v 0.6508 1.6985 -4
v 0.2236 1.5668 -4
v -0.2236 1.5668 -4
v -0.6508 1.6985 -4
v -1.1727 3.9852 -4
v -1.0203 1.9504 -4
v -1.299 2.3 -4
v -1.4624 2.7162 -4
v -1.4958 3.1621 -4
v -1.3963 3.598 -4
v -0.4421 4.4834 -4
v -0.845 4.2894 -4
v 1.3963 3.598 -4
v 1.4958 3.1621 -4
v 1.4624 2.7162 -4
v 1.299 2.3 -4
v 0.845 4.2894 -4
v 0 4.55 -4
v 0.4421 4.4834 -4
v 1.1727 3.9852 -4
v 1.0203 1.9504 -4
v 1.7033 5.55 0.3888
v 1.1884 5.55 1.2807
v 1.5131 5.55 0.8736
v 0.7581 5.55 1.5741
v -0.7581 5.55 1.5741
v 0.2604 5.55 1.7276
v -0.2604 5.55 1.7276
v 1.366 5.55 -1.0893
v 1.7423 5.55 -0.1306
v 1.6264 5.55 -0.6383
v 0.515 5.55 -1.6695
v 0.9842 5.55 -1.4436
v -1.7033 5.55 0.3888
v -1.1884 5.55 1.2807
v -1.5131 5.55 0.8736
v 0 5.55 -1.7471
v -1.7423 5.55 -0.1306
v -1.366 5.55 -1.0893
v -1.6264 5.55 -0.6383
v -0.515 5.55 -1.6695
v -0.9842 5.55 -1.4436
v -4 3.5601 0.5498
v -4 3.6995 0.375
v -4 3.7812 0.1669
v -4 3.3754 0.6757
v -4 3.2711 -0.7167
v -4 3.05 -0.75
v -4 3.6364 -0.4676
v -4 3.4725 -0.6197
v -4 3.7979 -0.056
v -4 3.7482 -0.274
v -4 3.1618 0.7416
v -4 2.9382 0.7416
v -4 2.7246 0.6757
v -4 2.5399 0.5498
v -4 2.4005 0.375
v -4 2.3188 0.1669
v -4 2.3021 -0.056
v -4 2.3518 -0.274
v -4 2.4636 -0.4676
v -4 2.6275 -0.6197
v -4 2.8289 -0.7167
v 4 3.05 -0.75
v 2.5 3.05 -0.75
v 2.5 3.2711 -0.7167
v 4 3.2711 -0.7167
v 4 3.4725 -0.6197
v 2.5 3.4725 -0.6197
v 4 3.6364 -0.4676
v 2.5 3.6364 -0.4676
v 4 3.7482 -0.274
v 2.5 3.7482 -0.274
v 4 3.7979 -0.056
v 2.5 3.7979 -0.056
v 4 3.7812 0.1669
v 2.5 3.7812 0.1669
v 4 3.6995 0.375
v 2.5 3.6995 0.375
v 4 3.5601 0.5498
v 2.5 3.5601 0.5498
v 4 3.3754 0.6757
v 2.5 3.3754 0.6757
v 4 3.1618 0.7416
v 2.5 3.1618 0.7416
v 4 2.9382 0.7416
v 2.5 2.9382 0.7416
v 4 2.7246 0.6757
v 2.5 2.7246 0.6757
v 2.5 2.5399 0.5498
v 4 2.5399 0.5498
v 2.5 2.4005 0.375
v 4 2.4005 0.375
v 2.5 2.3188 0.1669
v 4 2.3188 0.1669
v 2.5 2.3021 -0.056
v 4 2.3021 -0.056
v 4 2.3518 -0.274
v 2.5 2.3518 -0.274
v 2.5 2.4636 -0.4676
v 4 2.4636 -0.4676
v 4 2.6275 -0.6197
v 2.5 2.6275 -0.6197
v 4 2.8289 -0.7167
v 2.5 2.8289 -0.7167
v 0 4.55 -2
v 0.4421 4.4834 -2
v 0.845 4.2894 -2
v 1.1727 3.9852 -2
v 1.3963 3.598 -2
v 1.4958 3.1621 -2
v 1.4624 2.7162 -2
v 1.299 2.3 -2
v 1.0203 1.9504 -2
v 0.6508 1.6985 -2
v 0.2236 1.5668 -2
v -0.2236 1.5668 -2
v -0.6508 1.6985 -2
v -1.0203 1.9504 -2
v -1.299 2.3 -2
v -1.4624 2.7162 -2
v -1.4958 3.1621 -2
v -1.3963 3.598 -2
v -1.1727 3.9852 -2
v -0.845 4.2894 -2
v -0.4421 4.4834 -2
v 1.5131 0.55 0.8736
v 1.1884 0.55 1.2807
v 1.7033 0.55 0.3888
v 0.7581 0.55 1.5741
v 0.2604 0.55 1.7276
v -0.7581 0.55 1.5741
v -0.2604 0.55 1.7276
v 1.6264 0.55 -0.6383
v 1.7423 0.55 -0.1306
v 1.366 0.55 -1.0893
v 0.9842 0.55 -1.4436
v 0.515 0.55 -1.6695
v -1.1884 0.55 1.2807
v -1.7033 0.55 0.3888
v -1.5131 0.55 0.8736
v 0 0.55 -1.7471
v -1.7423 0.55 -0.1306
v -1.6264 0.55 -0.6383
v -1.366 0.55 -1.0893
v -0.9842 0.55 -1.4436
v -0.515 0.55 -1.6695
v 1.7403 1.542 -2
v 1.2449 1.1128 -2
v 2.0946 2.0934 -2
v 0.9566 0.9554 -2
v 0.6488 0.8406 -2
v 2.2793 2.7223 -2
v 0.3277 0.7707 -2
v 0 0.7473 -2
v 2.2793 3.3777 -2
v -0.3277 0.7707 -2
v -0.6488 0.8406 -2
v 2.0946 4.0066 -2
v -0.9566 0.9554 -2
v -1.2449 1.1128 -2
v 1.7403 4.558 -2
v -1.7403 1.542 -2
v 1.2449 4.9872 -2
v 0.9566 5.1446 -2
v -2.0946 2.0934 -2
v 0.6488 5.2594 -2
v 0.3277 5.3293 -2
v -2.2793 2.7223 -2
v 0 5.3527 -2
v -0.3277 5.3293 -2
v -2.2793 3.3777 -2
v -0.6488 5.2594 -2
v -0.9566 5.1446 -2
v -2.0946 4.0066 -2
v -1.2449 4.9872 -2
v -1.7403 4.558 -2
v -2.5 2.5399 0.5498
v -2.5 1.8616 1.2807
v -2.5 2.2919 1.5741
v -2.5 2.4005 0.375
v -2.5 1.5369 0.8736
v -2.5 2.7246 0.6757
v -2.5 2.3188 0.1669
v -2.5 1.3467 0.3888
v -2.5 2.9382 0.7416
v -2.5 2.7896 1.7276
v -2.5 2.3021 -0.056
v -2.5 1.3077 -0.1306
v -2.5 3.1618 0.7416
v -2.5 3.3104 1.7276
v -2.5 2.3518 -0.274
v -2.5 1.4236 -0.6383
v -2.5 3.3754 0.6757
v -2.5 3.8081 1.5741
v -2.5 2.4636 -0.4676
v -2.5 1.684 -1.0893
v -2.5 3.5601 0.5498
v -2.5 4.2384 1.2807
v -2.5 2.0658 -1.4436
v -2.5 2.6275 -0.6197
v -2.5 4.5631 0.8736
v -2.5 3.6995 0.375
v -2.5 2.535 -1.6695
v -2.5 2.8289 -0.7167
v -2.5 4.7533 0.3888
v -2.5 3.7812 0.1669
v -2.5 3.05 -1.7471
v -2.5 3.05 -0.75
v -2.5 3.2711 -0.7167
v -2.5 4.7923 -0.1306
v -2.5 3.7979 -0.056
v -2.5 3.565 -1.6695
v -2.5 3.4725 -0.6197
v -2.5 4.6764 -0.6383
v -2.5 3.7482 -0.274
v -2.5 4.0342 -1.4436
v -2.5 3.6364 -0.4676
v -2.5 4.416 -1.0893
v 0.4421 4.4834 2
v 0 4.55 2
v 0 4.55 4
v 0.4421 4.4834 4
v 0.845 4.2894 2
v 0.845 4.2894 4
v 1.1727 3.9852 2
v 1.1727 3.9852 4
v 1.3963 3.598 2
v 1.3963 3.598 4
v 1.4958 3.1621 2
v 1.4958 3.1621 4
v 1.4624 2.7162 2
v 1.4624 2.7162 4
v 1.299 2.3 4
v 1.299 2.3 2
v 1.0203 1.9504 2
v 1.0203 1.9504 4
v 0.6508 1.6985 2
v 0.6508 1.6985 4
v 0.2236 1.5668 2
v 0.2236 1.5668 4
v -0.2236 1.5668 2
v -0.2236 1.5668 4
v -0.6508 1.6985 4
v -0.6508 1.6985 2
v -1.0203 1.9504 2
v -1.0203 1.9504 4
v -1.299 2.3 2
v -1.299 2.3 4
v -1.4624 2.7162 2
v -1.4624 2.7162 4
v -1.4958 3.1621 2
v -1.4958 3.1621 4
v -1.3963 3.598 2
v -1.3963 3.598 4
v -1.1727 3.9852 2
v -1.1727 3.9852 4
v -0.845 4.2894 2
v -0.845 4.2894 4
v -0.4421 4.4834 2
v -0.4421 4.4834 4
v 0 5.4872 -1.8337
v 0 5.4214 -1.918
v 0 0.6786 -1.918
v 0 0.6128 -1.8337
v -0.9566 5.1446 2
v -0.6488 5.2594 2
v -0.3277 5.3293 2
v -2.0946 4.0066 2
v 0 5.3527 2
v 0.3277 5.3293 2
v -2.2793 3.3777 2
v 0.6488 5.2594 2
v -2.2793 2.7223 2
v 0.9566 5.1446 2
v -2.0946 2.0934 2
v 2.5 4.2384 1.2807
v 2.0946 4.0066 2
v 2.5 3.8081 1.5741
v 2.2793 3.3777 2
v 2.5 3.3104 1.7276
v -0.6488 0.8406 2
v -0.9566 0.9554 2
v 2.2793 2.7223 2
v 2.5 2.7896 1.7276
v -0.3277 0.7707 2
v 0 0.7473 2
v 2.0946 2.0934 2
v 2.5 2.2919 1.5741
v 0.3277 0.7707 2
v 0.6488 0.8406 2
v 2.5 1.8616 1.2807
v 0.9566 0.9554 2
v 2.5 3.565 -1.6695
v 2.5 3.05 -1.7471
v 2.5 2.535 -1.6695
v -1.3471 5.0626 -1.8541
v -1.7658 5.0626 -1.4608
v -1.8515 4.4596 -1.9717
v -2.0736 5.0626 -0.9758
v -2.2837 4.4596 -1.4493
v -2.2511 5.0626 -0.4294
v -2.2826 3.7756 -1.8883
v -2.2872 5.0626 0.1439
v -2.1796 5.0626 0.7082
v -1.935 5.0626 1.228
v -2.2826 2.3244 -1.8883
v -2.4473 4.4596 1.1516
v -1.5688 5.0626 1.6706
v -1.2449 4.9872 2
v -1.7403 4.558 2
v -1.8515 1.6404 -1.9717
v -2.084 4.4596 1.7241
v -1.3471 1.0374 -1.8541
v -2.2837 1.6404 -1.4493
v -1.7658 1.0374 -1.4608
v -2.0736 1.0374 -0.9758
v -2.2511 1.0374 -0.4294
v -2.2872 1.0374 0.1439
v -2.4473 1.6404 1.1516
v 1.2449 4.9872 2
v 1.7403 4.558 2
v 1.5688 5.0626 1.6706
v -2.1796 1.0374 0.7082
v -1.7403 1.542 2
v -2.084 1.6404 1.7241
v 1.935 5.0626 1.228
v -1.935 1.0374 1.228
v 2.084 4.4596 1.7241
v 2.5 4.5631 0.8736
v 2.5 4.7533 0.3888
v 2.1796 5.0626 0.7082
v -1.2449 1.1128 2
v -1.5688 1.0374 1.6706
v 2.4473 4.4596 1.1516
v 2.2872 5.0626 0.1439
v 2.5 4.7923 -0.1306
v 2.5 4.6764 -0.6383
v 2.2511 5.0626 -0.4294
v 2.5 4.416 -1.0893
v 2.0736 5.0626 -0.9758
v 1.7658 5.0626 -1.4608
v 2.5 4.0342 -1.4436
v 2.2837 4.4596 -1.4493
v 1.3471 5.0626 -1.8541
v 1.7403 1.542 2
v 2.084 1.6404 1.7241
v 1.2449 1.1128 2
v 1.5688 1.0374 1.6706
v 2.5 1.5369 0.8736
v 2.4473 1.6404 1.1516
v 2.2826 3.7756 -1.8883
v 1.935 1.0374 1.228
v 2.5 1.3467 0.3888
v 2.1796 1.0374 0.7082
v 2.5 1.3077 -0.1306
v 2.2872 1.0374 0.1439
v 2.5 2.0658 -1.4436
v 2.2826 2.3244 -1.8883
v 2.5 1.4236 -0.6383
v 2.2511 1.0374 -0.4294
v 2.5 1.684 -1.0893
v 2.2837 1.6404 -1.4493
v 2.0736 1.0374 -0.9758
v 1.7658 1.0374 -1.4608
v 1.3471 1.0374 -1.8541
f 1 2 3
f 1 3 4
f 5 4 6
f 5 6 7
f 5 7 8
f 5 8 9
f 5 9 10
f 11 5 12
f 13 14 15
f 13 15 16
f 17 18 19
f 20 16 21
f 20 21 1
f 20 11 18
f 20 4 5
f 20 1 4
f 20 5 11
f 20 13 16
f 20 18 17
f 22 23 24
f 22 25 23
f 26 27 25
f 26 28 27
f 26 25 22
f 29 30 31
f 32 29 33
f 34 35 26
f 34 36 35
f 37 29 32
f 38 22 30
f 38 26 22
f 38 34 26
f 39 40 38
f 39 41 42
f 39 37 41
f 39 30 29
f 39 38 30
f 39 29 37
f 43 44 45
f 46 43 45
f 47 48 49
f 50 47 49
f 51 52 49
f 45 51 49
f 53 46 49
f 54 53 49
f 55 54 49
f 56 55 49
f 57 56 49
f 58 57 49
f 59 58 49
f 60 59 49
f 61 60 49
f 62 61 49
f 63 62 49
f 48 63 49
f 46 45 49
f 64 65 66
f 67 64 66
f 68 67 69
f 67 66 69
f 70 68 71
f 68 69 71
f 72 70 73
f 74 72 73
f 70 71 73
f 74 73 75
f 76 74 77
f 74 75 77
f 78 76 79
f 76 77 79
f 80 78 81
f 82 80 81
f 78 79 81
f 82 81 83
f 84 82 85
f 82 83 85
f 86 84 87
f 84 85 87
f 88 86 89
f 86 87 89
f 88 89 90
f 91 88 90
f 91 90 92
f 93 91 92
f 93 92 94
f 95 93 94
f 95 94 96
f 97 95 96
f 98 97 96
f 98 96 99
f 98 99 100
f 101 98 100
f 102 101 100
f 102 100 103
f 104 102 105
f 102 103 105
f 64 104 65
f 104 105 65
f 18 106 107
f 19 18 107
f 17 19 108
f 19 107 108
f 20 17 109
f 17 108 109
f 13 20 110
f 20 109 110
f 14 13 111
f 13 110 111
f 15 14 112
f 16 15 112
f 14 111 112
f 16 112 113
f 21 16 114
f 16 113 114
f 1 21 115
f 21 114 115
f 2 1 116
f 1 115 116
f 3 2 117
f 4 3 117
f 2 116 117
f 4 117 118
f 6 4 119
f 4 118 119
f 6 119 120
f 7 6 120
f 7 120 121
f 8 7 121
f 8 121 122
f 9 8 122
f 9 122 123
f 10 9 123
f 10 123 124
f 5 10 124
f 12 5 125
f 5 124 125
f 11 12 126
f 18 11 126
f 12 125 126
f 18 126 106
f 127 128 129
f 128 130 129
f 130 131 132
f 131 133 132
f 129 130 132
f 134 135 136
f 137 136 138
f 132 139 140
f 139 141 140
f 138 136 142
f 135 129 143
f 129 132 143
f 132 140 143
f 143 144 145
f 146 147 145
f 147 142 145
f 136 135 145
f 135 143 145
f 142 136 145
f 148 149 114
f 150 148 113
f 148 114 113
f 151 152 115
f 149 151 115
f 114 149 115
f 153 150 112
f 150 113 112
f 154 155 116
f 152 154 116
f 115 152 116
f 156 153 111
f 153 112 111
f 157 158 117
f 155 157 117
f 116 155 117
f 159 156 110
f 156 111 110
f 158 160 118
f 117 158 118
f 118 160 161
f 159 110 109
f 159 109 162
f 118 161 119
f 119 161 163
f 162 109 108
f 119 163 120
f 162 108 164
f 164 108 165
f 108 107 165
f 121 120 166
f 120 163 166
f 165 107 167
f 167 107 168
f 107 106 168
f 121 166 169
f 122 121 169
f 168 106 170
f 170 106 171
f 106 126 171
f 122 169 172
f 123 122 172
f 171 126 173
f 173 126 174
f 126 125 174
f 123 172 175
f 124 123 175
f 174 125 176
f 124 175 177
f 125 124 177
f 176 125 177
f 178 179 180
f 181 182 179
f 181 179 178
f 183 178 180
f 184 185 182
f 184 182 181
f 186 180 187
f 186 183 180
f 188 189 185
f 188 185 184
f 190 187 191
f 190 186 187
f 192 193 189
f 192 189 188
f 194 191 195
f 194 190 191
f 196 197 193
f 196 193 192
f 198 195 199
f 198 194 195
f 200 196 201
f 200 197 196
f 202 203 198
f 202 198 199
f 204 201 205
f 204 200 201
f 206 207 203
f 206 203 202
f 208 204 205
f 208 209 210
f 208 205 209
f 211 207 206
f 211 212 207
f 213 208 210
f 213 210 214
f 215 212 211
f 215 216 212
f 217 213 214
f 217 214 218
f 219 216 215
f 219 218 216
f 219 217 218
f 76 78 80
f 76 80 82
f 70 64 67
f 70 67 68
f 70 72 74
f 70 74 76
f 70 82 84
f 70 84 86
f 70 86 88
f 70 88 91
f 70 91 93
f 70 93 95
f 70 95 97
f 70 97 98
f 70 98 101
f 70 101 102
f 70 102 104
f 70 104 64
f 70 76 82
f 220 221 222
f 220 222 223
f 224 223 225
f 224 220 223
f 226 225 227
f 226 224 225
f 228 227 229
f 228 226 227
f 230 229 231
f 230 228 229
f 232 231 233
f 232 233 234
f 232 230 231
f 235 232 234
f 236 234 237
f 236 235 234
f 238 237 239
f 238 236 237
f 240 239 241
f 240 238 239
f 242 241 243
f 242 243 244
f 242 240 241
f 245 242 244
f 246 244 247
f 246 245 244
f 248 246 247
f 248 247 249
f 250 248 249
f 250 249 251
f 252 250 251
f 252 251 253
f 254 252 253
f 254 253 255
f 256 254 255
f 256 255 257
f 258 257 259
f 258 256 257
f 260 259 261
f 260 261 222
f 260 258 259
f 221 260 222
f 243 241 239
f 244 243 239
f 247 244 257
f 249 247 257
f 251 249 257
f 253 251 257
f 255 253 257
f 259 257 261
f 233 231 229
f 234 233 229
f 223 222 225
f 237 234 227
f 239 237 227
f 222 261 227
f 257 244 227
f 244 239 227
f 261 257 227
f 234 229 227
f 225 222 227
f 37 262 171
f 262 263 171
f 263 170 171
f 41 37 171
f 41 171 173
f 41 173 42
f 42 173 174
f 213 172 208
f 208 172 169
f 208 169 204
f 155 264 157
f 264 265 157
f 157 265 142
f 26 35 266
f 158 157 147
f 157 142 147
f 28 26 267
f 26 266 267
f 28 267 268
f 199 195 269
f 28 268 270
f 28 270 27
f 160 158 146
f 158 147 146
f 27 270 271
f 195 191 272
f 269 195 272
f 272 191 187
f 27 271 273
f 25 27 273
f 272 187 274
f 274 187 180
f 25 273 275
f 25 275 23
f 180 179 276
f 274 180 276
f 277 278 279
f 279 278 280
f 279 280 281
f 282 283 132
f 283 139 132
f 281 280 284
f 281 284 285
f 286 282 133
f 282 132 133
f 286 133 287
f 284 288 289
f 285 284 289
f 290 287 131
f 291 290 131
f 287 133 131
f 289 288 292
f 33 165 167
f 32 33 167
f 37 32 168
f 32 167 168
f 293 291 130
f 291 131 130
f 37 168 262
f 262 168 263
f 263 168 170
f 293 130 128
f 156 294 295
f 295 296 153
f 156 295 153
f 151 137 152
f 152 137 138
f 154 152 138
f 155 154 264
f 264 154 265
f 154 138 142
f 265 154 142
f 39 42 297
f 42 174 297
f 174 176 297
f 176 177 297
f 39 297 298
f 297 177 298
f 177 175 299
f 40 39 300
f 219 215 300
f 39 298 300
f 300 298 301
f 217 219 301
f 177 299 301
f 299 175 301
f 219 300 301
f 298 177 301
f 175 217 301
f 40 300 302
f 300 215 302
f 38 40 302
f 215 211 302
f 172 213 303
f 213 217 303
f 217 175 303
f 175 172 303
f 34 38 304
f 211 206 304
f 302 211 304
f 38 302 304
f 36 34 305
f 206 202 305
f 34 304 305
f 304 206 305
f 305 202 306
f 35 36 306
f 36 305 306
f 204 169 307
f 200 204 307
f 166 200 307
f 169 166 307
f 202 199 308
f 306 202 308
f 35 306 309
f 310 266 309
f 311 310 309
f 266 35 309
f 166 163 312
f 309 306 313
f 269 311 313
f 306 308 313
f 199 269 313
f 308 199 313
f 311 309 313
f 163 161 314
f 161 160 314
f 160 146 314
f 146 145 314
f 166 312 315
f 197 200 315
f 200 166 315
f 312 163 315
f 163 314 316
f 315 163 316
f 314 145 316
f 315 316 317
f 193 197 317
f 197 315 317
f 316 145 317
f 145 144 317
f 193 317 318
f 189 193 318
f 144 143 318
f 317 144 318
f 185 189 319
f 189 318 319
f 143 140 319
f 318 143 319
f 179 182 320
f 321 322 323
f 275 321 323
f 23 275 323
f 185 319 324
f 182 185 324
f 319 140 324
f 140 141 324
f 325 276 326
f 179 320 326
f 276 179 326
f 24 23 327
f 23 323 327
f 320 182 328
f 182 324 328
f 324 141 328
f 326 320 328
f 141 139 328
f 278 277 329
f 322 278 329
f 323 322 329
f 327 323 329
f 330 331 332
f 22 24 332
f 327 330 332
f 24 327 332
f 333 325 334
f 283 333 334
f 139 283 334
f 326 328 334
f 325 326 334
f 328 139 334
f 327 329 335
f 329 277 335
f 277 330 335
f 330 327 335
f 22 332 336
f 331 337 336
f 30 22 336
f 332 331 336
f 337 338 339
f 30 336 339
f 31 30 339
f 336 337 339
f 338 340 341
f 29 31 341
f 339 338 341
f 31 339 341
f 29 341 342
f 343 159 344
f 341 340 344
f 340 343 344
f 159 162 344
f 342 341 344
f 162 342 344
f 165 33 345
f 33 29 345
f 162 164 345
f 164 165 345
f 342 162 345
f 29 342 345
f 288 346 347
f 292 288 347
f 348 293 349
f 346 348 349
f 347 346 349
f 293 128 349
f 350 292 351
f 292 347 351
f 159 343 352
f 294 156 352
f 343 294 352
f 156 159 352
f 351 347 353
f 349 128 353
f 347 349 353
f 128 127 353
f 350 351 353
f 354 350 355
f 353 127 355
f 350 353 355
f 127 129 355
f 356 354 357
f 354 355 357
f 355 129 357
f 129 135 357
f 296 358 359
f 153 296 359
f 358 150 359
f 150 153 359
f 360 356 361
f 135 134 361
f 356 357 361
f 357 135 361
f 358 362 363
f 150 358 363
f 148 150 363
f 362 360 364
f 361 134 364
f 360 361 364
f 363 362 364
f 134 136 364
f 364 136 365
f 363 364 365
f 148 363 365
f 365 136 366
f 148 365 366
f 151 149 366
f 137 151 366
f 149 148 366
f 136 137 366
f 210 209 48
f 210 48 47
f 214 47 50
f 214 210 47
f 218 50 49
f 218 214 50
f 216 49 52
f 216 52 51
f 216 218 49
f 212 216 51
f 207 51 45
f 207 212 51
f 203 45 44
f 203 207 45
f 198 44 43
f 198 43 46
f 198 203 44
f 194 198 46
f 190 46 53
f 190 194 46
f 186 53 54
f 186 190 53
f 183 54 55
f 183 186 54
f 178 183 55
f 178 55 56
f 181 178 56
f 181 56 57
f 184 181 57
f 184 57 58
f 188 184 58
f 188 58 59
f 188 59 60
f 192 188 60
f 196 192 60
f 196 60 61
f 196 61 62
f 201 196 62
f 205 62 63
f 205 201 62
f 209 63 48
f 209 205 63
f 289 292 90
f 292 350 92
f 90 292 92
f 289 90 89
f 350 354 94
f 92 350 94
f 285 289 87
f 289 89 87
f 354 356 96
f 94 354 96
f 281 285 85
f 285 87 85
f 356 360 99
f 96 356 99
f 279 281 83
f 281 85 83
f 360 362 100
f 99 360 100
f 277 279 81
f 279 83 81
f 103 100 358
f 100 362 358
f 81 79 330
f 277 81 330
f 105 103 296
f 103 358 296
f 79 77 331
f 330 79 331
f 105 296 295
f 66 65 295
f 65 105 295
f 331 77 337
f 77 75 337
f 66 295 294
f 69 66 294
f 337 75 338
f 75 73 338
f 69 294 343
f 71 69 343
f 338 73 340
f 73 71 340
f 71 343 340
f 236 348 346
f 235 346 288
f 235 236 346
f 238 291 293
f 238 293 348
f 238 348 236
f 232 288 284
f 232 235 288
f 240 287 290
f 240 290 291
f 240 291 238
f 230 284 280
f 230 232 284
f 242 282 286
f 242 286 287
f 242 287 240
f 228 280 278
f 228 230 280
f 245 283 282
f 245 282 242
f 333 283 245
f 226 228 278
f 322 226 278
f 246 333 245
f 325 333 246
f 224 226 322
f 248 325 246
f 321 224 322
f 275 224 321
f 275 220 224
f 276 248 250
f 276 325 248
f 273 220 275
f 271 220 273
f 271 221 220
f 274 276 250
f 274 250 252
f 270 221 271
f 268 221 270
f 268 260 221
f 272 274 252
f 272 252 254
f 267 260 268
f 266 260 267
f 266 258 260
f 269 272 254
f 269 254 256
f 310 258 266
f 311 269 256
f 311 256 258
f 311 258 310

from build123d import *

# Parameters (mm, degrees)
CUT_EXTRUDE1_DEPTH      = 8.470943715
CUT_EXTRUDE1_DEPTH_BACK = 8.470943715
SKETCH3_OUTSIDE_W       = 10.214
SKETCH3_OUTSIDE_H       = 10.214
SKETCH3_OUTSIDE_W_2     = 4
SKETCH3_OUTSIDE_H_2     = 5
CUT_EXTRUDE2_DEPTH      = 7.641159537
CUT_EXTRUDE2_DEPTH_BACK = 7.641159537
SKETCH4_OUTSIDE_W       = 9.868
SKETCH4_OUTSIDE_H       = 8.768
SKETCH4_OUTSIDE_W_2     = 5
SKETCH4_OUTSIDE_H_2     = 5
SKETCH5_R               = 0.75
BOSS_EXTRUDE1_DEPTH     = 1.5
SKETCH6_R               = 1.5
BOSS_EXTRUDE2_DEPTH     = 2


with BuildPart() as part:
    # Sketch2 → Revolve3 (revolve)
    with BuildSketch(Plane(origin=(0, 0, 0), x_dir=(0, 0, -1), z_dir=(1, 0, 0))):
        with BuildLine():
            Line((0, 0), (0, 6.1))
            ThreePointArc((0, 6.1), (3.05, 3.05), (0, 0))
        make_face()
    revolve(axis=Axis((0, 0, 0), (0, 1, 0)))

    # Sketch3 outside → Cut-Extrude1 (cut, two sides: drawn at the far end of the back side and taken through both)
    with BuildSketch(Plane(origin=(0, 0, 0), x_dir=(0, 0, -1), z_dir=(1, 0, 0)).offset(-CUT_EXTRUDE1_DEPTH_BACK)):
        with Locations((0, 3.05)):
            Rectangle(SKETCH3_OUTSIDE_W, SKETCH3_OUTSIDE_H)
        with Locations((0, 3.05)):
            Rectangle(SKETCH3_OUTSIDE_W_2, SKETCH3_OUTSIDE_H_2, mode=Mode.SUBTRACT)
    extrude(amount=CUT_EXTRUDE1_DEPTH + CUT_EXTRUDE1_DEPTH_BACK, mode=Mode.SUBTRACT)

    # Sketch4 outside → Cut-Extrude2 (cut, two sides: drawn at the far end of the back side and taken through both)
    with BuildSketch(Plane.XY.offset(-CUT_EXTRUDE2_DEPTH_BACK)):
        with Locations((0, 3.05)):
            Rectangle(SKETCH4_OUTSIDE_W, SKETCH4_OUTSIDE_H)
        with Locations((0, 3.05)):
            Rectangle(SKETCH4_OUTSIDE_W_2, SKETCH4_OUTSIDE_H_2, mode=Mode.SUBTRACT)
    extrude(amount=CUT_EXTRUDE2_DEPTH + CUT_EXTRUDE2_DEPTH_BACK, mode=Mode.SUBTRACT)

    # Sketch5 → Boss-Extrude1 (add)
    with BuildSketch(Plane(origin=(2.5, 0, 0), x_dir=(0, 0, -1), z_dir=(1, 0, 0))):
        with Locations((0, 3.05)):
            Circle(SKETCH5_R)
    boss_extrude1 = extrude(amount=BOSS_EXTRUDE1_DEPTH)

    # Mirror1: Boss-Extrude1 across plane
    add(boss_extrude1.mirror(Plane(origin=(0, 0, 0), x_dir=(0, 0, 1), z_dir=(1, 0, 0))))

    # Sketch6 → Boss-Extrude2 (add)
    with BuildSketch(Plane(origin=(0, 0, -2), x_dir=(-1, 0, 0), z_dir=(0, 0, -1))):
        with Locations(Location((0, 3.05, 0), (0, 0, 90))):
            Circle(SKETCH6_R)
    boss_extrude2 = extrude(amount=BOSS_EXTRUDE2_DEPTH)

    # Mirror2: Boss-Extrude2 across plane
    add(boss_extrude2.mirror(Plane.XY))


solid = part.part
